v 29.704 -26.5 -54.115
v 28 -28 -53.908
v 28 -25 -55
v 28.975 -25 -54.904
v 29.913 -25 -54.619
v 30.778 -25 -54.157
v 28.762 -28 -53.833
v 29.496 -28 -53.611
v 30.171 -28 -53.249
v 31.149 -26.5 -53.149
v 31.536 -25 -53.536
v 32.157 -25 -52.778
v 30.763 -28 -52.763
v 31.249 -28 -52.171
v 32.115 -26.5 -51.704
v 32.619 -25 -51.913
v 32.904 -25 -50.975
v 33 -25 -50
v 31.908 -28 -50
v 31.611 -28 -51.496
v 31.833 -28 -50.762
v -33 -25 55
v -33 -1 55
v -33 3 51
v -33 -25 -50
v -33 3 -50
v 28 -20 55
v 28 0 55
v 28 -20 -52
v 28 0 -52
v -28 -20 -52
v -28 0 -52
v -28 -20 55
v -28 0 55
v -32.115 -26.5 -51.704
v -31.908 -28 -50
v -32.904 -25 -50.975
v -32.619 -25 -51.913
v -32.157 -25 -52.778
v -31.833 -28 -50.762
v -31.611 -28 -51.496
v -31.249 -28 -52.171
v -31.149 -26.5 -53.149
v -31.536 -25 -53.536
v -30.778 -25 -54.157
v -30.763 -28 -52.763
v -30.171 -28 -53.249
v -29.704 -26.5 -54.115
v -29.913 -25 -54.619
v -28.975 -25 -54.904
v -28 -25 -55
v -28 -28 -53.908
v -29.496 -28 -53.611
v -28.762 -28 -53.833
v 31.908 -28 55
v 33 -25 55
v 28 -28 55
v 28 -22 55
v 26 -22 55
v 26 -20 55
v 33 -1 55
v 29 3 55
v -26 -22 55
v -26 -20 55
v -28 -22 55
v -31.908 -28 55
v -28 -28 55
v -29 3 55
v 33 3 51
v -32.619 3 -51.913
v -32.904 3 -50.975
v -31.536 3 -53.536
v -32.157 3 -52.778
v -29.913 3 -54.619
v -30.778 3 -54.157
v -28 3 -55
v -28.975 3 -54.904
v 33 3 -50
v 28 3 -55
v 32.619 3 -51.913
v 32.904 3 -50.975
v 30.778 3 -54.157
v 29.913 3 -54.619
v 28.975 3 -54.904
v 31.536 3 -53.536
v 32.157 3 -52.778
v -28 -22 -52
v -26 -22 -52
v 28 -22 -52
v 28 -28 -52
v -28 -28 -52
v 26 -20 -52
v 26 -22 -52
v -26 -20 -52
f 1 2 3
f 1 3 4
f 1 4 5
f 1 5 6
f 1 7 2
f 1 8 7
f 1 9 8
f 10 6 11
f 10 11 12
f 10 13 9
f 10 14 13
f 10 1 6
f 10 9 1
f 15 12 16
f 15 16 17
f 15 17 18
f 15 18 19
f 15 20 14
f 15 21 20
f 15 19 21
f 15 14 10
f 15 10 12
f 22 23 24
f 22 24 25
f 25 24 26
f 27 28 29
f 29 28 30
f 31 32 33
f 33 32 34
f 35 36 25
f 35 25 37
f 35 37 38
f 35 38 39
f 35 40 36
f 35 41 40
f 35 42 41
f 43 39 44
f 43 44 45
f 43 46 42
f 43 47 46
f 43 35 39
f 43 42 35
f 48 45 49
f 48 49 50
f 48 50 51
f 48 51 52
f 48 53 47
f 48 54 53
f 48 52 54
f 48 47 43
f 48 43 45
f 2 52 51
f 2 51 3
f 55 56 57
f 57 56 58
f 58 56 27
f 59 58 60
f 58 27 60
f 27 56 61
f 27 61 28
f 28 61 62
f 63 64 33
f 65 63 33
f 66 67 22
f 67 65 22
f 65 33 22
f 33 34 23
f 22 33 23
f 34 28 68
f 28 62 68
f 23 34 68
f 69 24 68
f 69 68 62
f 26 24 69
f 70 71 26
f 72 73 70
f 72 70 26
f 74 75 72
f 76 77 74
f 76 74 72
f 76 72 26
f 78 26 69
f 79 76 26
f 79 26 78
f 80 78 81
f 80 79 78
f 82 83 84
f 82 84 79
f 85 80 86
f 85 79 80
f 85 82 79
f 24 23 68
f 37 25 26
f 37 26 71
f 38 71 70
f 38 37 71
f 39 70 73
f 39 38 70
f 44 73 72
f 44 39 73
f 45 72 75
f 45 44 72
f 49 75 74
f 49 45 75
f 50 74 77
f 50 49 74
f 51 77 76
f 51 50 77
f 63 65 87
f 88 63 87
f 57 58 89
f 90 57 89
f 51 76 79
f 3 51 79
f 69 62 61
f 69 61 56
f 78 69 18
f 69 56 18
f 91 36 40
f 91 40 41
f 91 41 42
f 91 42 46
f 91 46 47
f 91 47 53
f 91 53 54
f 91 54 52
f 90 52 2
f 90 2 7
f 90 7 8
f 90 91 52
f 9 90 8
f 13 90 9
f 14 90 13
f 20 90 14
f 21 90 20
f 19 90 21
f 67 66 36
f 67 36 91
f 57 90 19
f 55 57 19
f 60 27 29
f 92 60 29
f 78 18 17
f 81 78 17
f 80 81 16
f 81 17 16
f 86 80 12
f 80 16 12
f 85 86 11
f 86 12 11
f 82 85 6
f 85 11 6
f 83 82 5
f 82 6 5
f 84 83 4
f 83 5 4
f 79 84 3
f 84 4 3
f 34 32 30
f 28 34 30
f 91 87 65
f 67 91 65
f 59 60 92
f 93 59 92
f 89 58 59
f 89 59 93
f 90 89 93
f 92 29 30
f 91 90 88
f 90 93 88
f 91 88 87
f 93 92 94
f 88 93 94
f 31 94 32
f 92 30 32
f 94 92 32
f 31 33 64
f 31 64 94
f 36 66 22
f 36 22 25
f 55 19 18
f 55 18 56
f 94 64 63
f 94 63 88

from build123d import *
from OCP.BRepFilletAPI import BRepFilletAPI_MakeChamfer

# Parameters (mm, degrees)
CROQUIS1_W              = 66
CROQUIS1_H              = 110
SALIENTE_EXTRUIR1_DEPTH = 3
SALIENTE_EXTRUIR2_DEPTH = 28
CROQUIS3_W              = 107
CROQUIS3_H              = 2
SALIENTE_EXTRUIR3_DEPTH = 2
REDONDEO1_R             = 5
CHAFL_N1_SIZE           = 3
CHAFL_N1_SIZE2          = 1.091910703
CHAFL_N2_START          = -54
CHAFL_N2_OUTLINE_W      = 7
CHAFL_N2_OUTLINE_H      = 9
CHAFL_N2_DEPTH          = 3.770526581
CHAFL_N3_START          = 50.229473419
CHAFL_N3_OUTLINE_W      = 8
CHAFL_N3_OUTLINE_H      = 9
CHAFL_N3_DEPTH          = 3.770526581


with BuildPart() as part:
    # Croquis1 → Saliente-Extruir1 (new body)
    with BuildSketch(Plane(origin=(0, 0, 0), x_dir=(1, 0, 0), z_dir=(0, 1, 0))):
        Rectangle(CROQUIS1_W, CROQUIS1_H)
    extrude(amount=SALIENTE_EXTRUIR1_DEPTH)

    # Croquis2 → Saliente-Extruir2 (add)
    with BuildSketch(Plane.XZ):
        Polygon((-28, 55), (-33, 55), (-33, -49.5), (-33, -55), (-28, -55), (28, -55), (33, -55), (33, -52), (33, 55), (28, 55), (28, -52), (-28, -52), align=None)
    extrude(amount=SALIENTE_EXTRUIR2_DEPTH)

    # Croquis3 → Saliente-Extruir3 (add)
    with BuildSketch(Plane(origin=(-28, 0, 0), x_dir=(0, 0, -1), z_dir=(1, 0, 0))):
        with Locations((-1.5, -21)):
            Rectangle(CROQUIS3_W, CROQUIS3_H)
    saliente_extruir3 = extrude(amount=SALIENTE_EXTRUIR3_DEPTH)

    # Simetría1: Saliente-Extruir3 across plane
    add(saliente_extruir3.mirror(Plane(origin=(0, 0, 0), x_dir=(0, 0, 1), z_dir=(1, 0, 0))))

    # Redondeo1
    redondeo1_edges = [part.edges().sort_by_distance(p)[0] for p in [
        (-33, -12.5, -55),
        (33, -12.5, -55),
    ]]
    fillet(redondeo1_edges, radius=REDONDEO1_R)

    # Chaflán1: one chamfer whose edges measure the first distance from different faces: ONE call of the kernel's chamfer builder (chamfer() names one face for all edges)
    chafl_n1_edges_1 = [part.edges().sort_by_distance(p)[0] for p in [
        (-33, -28, 2.5),
    ]]
    chafl_n1_side_1 = [part.faces().sort_by_distance(p)[0] for p in [
        (-33, -12.5, 2.5),
    ]]
    chafl_n1_edges_2 = [part.edges().sort_by_distance(p)[0] for p in [
        (0, -28, -55),
    ]]
    chafl_n1_side_2 = [part.faces().sort_by_distance(p)[0] for p in [
        (0, -12.5, -55),
    ]]
    chafl_n1_edges_3 = [part.edges().sort_by_distance(p)[0] for p in [
        (33, -28, 2.5),
    ]]
    chafl_n1_side_3 = [part.faces().sort_by_distance(p)[0] for p in [
        (33, -12.5, 2.5),
    ]]
    chafl_n1_edges_4 = [part.edges().sort_by_distance(p)[0] for p in [
        (31.535533906, -28, -53.535533906),
    ]]
    chafl_n1_side_4 = [part.faces().sort_by_distance(p)[0] for p in [
        (31.535533906, -12.5, -53.535533906),
    ]]
    chafl_n1_edges_5 = [part.edges().sort_by_distance(p)[0] for p in [
        (-31.535533906, -28, -53.535533906),
    ]]
    chafl_n1_side_5 = [part.faces().sort_by_distance(p)[0] for p in [
        (-31.535533906, -12.5, -53.535533906),
    ]]
    chafl_n1 = BRepFilletAPI_MakeChamfer(part.part.solid().wrapped)
    for e in chafl_n1_edges_1:
        chafl_n1.Add(CHAFL_N1_SIZE, CHAFL_N1_SIZE2, e.wrapped, chafl_n1_side_1[0].wrapped)  # the first distance lies on this face
    for e in chafl_n1_edges_2:
        chafl_n1.Add(CHAFL_N1_SIZE, CHAFL_N1_SIZE2, e.wrapped, chafl_n1_side_2[0].wrapped)  # the first distance lies on this face
    for e in chafl_n1_edges_3:
        chafl_n1.Add(CHAFL_N1_SIZE, CHAFL_N1_SIZE2, e.wrapped, chafl_n1_side_3[0].wrapped)  # the first distance lies on this face
    for e in chafl_n1_edges_4:
        chafl_n1.Add(CHAFL_N1_SIZE, CHAFL_N1_SIZE2, e.wrapped, chafl_n1_side_4[0].wrapped)  # the first distance lies on this face
    for e in chafl_n1_edges_5:
        chafl_n1.Add(CHAFL_N1_SIZE, CHAFL_N1_SIZE2, e.wrapped, chafl_n1_side_5[0].wrapped)  # the first distance lies on this face
    add(Compound.cast(chafl_n1.Shape()), mode=Mode.REPLACE)

    # Chaflán2: read off the stored shape, not the designer's step
    # Chaflán2 outline → Chaflán2 (cut)
    with BuildSketch(Plane(origin=(0, 0, 0), x_dir=(0.8164965809277258, 0.40824829046386313, 0.40824829046386313), z_dir=(0.5773502691896258, -0.5773502691896258, -0.5773502691896258)).offset(CHAFL_N2_START)):
        with Locations((-2.5, 36.5)):
            Rectangle(CHAFL_N2_OUTLINE_W, CHAFL_N2_OUTLINE_H)
    extrude(amount=CHAFL_N2_DEPTH, mode=Mode.SUBTRACT)

    # Chaflán3: read off the stored shape, not the designer's step
    # Chaflán3 outline → Chaflán3 (cut)
    with BuildSketch(Plane(origin=(0, 0, 0), x_dir=(0.8164965809277258, -0.40824829046386313, -0.40824829046386313), z_dir=(0.5773502691896258, 0.5773502691896258, 0.5773502691896258)).offset(CHAFL_N3_START)):
        with Locations((2, -36.5)):
            Rectangle(CHAFL_N3_OUTLINE_W, CHAFL_N3_OUTLINE_H)
    extrude(amount=CHAFL_N3_DEPTH, mode=Mode.SUBTRACT)


solid = part.part
